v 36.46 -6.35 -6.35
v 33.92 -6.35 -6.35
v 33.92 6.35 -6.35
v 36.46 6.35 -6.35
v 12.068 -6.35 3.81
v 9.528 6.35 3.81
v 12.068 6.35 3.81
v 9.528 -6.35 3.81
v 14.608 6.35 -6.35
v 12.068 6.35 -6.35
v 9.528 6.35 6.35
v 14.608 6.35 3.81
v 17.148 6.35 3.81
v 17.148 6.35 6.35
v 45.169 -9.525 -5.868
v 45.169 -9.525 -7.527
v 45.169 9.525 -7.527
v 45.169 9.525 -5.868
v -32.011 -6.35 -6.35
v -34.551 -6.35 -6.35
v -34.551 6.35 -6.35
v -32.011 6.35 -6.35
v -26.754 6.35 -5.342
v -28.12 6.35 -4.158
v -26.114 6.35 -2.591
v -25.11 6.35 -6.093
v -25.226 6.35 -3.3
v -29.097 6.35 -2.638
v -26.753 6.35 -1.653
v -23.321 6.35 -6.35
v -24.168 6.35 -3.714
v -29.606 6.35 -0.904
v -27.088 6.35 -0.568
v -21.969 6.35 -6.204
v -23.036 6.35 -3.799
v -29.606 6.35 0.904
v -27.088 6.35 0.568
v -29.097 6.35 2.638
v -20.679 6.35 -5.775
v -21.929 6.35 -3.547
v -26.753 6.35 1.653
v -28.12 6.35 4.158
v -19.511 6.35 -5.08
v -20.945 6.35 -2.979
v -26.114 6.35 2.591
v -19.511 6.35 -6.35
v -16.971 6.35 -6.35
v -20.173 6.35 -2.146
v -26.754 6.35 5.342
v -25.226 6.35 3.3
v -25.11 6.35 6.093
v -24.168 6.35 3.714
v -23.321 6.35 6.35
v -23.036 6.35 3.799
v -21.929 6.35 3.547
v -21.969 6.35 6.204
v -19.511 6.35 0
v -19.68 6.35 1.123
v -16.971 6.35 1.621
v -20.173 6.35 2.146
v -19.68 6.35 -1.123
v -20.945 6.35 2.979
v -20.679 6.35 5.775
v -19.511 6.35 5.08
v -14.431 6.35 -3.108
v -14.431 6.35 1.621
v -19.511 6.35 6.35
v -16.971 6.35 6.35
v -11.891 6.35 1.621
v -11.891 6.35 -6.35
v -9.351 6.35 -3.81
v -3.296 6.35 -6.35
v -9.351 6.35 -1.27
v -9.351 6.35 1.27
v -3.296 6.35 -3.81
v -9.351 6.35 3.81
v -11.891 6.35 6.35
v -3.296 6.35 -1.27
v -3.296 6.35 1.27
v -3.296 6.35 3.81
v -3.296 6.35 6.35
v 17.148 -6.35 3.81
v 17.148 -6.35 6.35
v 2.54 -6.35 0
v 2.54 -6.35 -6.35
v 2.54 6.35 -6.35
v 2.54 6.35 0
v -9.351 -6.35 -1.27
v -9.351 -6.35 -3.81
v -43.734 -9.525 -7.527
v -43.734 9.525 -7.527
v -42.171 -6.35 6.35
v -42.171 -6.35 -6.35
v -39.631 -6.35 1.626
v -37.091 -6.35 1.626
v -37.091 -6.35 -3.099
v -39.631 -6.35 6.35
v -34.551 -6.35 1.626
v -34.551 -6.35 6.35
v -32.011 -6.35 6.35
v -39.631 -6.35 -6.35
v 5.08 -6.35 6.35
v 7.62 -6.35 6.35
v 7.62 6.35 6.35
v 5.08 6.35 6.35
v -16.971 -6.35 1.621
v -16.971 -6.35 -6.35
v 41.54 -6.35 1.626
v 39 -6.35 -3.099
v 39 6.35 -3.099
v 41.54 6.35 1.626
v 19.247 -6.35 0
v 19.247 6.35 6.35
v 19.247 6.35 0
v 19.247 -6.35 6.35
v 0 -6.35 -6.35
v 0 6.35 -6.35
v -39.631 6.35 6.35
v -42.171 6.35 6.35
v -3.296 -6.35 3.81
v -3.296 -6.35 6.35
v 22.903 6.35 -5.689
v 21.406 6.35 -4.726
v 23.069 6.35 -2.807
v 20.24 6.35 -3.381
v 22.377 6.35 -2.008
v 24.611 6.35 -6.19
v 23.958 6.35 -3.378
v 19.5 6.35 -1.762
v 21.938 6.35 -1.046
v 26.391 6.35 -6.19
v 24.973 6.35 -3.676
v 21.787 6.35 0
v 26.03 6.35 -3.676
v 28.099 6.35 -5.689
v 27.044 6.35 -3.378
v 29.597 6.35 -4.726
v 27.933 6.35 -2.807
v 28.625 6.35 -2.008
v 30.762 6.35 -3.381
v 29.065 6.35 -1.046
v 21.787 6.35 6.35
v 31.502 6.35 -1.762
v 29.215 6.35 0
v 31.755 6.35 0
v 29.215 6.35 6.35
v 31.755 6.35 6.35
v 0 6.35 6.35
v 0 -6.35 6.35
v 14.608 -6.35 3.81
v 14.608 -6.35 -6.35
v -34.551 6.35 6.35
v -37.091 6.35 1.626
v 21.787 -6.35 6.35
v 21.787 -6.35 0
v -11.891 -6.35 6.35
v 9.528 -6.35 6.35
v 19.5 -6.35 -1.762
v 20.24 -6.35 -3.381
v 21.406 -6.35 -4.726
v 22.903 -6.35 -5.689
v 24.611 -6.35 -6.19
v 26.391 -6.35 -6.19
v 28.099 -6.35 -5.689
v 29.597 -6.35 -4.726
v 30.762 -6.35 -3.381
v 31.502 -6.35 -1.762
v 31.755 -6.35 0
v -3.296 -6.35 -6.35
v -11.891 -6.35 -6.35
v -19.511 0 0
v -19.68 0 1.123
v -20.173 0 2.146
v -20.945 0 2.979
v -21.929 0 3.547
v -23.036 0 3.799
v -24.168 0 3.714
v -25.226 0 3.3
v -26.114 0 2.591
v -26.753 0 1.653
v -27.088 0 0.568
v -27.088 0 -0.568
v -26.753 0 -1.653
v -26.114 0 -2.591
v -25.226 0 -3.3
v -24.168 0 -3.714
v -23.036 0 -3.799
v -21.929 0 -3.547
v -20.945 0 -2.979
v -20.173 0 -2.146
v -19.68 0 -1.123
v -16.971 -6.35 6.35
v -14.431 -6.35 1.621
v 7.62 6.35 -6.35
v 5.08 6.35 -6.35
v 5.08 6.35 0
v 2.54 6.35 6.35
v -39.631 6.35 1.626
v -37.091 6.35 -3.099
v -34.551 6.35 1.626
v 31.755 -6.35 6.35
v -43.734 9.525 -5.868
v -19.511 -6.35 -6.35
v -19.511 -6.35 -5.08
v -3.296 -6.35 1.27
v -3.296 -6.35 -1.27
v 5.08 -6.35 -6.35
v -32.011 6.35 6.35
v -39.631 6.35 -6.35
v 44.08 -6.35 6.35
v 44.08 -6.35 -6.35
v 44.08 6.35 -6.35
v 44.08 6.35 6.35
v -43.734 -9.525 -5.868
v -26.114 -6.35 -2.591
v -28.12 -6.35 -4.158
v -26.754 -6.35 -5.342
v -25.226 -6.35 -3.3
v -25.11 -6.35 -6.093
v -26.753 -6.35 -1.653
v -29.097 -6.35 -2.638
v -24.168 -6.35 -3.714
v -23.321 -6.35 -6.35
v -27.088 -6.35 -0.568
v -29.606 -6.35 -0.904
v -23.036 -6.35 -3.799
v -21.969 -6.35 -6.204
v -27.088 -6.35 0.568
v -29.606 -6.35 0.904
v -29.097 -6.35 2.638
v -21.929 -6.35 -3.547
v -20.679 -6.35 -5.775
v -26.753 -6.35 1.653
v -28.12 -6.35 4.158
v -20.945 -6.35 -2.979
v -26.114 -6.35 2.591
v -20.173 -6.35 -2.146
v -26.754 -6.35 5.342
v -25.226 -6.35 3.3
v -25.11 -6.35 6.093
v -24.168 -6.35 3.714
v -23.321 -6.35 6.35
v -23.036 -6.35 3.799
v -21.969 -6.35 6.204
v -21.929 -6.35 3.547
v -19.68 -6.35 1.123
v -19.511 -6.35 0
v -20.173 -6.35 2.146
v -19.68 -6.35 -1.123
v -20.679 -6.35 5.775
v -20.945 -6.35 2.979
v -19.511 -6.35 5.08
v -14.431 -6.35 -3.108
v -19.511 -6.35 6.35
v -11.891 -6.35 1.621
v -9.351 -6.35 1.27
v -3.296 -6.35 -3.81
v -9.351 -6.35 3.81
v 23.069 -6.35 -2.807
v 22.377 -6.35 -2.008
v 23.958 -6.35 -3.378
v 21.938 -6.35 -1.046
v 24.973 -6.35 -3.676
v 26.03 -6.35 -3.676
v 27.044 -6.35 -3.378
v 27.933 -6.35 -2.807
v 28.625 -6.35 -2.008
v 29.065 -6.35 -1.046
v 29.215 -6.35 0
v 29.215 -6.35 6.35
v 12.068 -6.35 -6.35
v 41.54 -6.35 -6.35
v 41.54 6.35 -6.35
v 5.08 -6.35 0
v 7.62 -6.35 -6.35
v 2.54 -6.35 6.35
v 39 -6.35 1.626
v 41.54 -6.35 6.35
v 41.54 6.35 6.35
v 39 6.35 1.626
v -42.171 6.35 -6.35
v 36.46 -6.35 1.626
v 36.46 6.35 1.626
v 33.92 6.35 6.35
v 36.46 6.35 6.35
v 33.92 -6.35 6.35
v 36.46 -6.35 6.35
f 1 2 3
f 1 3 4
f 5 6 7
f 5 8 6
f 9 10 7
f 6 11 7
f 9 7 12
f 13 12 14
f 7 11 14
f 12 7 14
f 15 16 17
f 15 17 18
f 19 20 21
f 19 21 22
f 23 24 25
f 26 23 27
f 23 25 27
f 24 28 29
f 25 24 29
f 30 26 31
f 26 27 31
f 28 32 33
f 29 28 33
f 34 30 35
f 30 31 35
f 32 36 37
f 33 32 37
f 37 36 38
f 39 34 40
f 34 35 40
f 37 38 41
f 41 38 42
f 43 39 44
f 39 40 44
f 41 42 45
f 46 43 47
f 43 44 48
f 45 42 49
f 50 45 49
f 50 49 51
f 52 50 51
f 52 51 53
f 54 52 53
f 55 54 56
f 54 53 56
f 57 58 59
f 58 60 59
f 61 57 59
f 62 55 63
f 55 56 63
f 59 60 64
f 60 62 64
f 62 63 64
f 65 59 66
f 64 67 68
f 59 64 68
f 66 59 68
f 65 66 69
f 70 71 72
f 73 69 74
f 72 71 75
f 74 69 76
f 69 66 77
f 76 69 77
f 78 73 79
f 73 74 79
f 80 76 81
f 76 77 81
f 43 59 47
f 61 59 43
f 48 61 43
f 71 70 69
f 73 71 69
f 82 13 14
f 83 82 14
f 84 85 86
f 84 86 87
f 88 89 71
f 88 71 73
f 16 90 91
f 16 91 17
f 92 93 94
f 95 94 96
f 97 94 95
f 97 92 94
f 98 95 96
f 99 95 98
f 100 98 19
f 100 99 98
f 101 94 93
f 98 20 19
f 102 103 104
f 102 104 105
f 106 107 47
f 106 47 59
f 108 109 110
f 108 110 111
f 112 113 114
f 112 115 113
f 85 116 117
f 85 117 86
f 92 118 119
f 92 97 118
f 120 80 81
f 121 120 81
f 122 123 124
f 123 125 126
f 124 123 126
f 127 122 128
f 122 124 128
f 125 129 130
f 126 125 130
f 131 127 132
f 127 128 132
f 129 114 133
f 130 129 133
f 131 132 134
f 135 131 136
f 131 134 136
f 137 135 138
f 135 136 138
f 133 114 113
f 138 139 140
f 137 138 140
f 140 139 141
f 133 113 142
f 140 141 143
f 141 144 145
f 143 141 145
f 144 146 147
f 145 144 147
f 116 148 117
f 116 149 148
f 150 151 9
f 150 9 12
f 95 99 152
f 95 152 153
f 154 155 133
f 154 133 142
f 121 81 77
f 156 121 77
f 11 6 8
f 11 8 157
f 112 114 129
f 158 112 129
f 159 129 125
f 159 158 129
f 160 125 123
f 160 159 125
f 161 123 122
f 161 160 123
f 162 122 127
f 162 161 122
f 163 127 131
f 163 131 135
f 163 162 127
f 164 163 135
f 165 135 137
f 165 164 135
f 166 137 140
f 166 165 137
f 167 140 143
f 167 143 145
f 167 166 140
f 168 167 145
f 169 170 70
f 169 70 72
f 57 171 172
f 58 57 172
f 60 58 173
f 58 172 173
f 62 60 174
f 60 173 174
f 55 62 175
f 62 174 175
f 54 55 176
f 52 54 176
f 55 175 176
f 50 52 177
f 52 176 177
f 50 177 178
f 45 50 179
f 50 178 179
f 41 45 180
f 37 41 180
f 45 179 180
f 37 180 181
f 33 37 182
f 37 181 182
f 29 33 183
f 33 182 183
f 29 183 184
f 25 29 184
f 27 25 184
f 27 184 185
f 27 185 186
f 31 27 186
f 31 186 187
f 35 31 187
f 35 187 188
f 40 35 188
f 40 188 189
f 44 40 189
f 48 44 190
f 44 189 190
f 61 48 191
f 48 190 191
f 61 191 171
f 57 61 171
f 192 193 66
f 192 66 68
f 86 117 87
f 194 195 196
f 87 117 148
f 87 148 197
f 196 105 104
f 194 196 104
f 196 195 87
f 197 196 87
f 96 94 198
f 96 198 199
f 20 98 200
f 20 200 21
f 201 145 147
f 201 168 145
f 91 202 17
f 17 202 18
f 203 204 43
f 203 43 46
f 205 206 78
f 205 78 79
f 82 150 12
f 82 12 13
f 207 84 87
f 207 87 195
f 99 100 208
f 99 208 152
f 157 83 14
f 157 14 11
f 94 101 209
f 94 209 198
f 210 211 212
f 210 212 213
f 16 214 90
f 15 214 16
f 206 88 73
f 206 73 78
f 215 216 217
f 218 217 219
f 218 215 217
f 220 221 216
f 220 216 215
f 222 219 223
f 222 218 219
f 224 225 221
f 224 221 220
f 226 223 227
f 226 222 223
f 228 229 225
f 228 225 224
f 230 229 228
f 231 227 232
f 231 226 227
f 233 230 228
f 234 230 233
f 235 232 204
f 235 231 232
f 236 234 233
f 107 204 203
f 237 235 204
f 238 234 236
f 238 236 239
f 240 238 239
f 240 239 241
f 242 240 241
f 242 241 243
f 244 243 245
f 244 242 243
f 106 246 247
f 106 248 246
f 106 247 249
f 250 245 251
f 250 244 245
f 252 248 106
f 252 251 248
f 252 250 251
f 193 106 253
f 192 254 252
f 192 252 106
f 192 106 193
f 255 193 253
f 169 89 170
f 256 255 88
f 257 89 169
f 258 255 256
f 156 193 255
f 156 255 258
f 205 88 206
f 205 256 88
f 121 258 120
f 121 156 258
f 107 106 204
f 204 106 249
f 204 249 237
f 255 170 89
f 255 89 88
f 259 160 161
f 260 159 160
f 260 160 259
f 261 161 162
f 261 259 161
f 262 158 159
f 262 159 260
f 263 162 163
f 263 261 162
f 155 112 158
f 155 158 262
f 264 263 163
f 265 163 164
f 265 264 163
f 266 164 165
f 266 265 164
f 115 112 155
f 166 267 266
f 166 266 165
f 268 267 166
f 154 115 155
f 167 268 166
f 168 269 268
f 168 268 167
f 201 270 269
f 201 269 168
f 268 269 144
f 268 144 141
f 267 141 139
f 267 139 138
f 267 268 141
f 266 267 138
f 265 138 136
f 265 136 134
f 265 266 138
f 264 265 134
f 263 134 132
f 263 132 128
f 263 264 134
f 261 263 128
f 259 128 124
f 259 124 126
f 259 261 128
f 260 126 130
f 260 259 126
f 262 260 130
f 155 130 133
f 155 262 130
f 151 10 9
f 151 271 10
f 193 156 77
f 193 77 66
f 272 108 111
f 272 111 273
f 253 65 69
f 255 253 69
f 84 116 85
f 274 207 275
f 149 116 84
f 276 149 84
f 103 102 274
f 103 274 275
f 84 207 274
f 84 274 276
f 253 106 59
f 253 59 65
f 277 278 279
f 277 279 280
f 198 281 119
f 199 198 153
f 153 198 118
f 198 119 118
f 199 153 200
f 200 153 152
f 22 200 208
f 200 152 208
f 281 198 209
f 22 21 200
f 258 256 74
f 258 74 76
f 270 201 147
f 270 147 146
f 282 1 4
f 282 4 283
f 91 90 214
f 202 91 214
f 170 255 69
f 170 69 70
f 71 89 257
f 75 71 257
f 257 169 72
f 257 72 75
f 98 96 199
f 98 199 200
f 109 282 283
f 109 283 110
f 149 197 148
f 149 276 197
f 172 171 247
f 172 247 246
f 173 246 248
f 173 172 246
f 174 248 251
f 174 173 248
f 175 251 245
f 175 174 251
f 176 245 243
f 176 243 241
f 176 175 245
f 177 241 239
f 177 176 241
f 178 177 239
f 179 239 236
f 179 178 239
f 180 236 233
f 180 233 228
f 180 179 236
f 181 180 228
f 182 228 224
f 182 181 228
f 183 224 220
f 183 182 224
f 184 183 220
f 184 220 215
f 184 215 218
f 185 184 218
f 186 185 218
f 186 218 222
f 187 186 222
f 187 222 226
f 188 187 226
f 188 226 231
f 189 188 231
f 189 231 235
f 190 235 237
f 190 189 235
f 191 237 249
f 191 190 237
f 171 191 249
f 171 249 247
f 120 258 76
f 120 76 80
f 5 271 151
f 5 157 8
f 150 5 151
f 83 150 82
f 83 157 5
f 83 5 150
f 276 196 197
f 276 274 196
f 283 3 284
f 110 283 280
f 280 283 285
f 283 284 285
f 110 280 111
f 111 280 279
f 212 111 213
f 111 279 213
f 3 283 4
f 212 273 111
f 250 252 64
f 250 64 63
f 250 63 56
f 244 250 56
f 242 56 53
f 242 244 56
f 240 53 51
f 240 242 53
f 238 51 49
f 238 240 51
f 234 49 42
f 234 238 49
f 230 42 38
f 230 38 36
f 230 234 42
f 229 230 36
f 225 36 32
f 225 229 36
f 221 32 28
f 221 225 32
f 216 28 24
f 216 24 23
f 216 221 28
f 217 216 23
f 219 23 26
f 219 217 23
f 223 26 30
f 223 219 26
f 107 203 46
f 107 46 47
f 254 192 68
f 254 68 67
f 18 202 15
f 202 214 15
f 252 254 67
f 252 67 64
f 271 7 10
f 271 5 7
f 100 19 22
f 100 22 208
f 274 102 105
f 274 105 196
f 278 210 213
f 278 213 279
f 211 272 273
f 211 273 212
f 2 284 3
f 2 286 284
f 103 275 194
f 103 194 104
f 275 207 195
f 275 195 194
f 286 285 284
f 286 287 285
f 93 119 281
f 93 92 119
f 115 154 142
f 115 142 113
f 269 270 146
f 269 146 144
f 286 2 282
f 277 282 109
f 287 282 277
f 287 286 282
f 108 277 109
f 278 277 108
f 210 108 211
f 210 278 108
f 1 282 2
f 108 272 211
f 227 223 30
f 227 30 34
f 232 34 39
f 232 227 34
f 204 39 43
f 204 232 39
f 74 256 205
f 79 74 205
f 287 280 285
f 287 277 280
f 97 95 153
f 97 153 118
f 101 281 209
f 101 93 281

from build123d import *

# Parameters (mm, degrees)
F1_DEPTH = 6.35
F0_R     = 3.81
F0_W     = 6.0548761711
F0_H     = 2.54
F0_W_2   = 2.54
F0_H_2   = 10.16
F2_W     = 88.9036133885
F2_H     = 1.6595339403
F3_DEPTH = 9.525


with BuildPart() as f1:
    # F0 (on Front) → F1 (new body, symmetric)
    with BuildSketch(Plane.XZ):
        Polygon((-42.1707964678, -6.35), (-39.6307964678, -6.35), (-39.6307964678, 1.6256), (-42.1707964678, 6.35), align=None)
        Polygon((-42.1707964678, 6.35), (-39.6307964678, 1.6256), (-39.6307964678, 6.35), align=None)
        Polygon((-39.6307964678, 6.35), (-39.6307964678, 1.6256), (-37.0907964678, -3.0988), (-37.0907964678, 1.6256), align=None)
        Polygon((-37.0907964678, 1.6256), (-37.0907964678, -3.0988), (-34.5507964678, 1.6256), (-34.5507964678, 6.35), align=None)
        Polygon((-34.5507964678, 6.35), (-34.5507964678, 1.6256), (-32.0107964678, 6.35), align=None)
        Polygon((-34.5507964678, 1.6256), (-34.5507964678, -6.35), (-32.0107964678, -6.35), (-32.0107964678, 6.35), align=None)
    extrude(amount=F1_DEPTH, both=True)


with BuildPart() as f1b:
    # F0 (on Front) → F1, piece 2 (new body, symmetric)
    with BuildSketch(Plane.XZ):
        with BuildLine():
            ThreePointArc((-23.3206523725, 6.35), (-29.6706523725, 0), (-23.3206523725, -6.35))
            ThreePointArc((-23.3206523725, -6.35), (-21.3126060583, -6.0241389426), (-19.5106523725, -5.08))
            Line((-19.5106523725, -5.08), (-19.5106523725, 0))
            Line((-19.5106523725, 0), (-19.5106523725, 5.08))
            ThreePointArc((-19.5106523725, 5.08), (-21.3126060583, 6.0241389426), (-23.3206523725, 6.35))
        make_face()
        with Locations((-23.3206523725, 0)):
            Circle(F0_R, mode=Mode.SUBTRACT)
        with BuildLine():
            ThreePointArc((-16.9706523725, 0), (-17.6410397097, 2.8398063314), (-19.5106523725, 5.08))
            Line((-19.5106523725, 5.08), (-19.5106523725, 0))
            Line((-19.5106523725, 0), (-16.9706523725, 0))
        make_face()
        with BuildLine():
            Line((-19.5106523725, 0), (-19.5106523725, -5.08))
            ThreePointArc((-19.5106523725, -5.08), (-17.6410397097, -2.8398063314), (-16.9706523725, 0))
            Line((-16.9706523725, 0), (-19.5106523725, 0))
        make_face()
        with BuildLine():
            Line((-19.5106523725, -5.08), (-19.5106523725, -6.35))
            Line((-19.5106523725, -6.35), (-16.9706523725, -6.35))
            Line((-16.9706523725, -6.35), (-16.9706523725, 0))
            ThreePointArc((-16.9706523725, 0), (-17.6410397097, -2.8398063314), (-19.5106523725, -5.08))
        make_face()
        Polygon((-16.9706523725, 6.35), (-19.5106523725, 6.35), (-16.9706523725, 1.621060252), align=None)
        with BuildLine():
            Line((-16.9706523725, 1.621060252), (-19.5106523725, 6.35))
            Line((-19.5106523725, 6.35), (-19.5106523725, 5.08))
            ThreePointArc((-19.5106523725, 5.08), (-17.6410397097, 2.8398063314), (-16.9706523725, 0))
            Line((-16.9706523725, 0), (-16.9706523725, 1.621060252))
        make_face()
        Polygon((-14.4306523725, 1.621060252), (-16.9706523725, 6.35), (-16.9706523725, 1.621060252), (-14.4306523725, -3.1078794961), align=None)
        Polygon((-11.8906523725, 6.35), (-14.4306523725, 1.621060252), (-14.4306523725, -3.1078794961), (-11.8906523725, 1.621060252), (-11.8906523725, 3.81), align=None)
        Polygon((-9.3506523725, 6.35), (-11.8906523725, 6.35), (-11.8906523725, 3.81), (-10.7149328125, 3.81), align=None)
        Polygon((-11.8906523725, 3.81), (-11.8906523725, 1.621060252), (-10.7149328125, 3.81), align=None)
        with Locations((-6.323214287, 5.08)):
            Rectangle(F0_W, F0_H)
        Polygon((-10.7149328125, 3.81), (-11.8906523725, 1.621060252), (-11.8906523725, 1.27), (-9.3506523725, 1.27), (-9.3506523725, 3.81), align=None)
        Polygon((-9.3506523725, 3.81), (-9.3506523725, 6.35), (-10.7149328125, 3.81), align=None)
        with Locations((-10.6206523725, 0)):
            Rectangle(F0_W_2, F0_H)
        with Locations((-6.323214287, 0)):
            Rectangle(F0_W, F0_H)
        with Locations((-10.6206523725, -2.54)):
            Rectangle(F0_W_2, F0_H)
        with Locations((-10.6206523725, -5.08)):
            Rectangle(F0_W_2, F0_H)
        with Locations((-6.323214287, -5.08)):
            Rectangle(F0_W, F0_H)
    extrude(amount=F1_DEPTH, both=True)


with BuildPart() as f1c:
    # F0 (on Front) → F1, piece 3 (new body, symmetric)
    with BuildSketch(Plane.XZ):
        Polygon((0, 6.35), (0, -6.35), (2.54, -6.35), (2.54, 0), align=None)
        Polygon((2.54, 6.35), (0, 6.35), (2.54, 0), align=None)
        Polygon((5.08, 0), (2.54, 6.35), (2.54, 0), (5.08, -6.35), align=None)
        Polygon((5.08, 0), (5.08, -6.35), (7.62, -6.35), align=None)
        Polygon((5.08, 6.35), (5.08, 0), (7.62, -6.35), (7.62, 6.35), align=None)
    extrude(amount=F1_DEPTH, both=True)


with BuildPart() as f1d:
    # F0 (on Front) → F1, piece 4 (new body, symmetric)
    with BuildSketch(Plane.XZ):
        with Locations((13.3382392576, -1.27)):
            Rectangle(F0_W_2, F0_H_2)
        with Locations((15.8782392576, 5.08)):
            Rectangle(F0_W_2, F0_H)
        with Locations((13.3382392576, 5.08)):
            Rectangle(F0_W_2, F0_H)
        with Locations((10.7982392576, 5.08)):
            Rectangle(F0_W_2, F0_H)
    extrude(amount=F1_DEPTH, both=True)


with BuildPart() as f1e:
    # F0 (on Front) → F1, piece 5 (new body, symmetric)
    with BuildSketch(Plane.XZ):
        with BuildLine():
            Line((31.7550115287, 0), (31.7550115287, 6.35))
            Line((31.7550115287, 6.35), (29.2150115287, 6.35))
            Line((29.2150115287, 6.35), (29.2150115287, 0))
            ThreePointArc((29.2150115287, 0), (25.5010910332, -3.7139204955), (21.7871705377, 0))
            Line((21.7871705377, 0), (21.7871705377, 6.35))
            Line((21.7871705377, 6.35), (19.2471705377, 6.35))
            Line((19.2471705377, 6.35), (19.2471705377, 0))
            ThreePointArc((19.2471705377, 0), (25.5010910332, -6.2539204955), (31.7550115287, 0))
        make_face()
    extrude(amount=F1_DEPTH, both=True)


with BuildPart() as f1f:
    # F0 (on Front) → F1, piece 6 (new body, symmetric)
    with BuildSketch(Plane.XZ):
        Polygon((33.9198186994, 6.35), (33.9198186994, -6.35), (36.4598186994, -6.35), (36.4598186994, 1.6256), align=None)
        Polygon((36.4598186994, 6.35), (33.9198186994, 6.35), (36.4598186994, 1.6256), align=None)
        Polygon((36.4598186994, 6.35), (36.4598186994, 1.6256), (38.9998186994, -3.0988), (38.9998186994, 1.6256), align=None)
        Polygon((38.9998186994, 1.6256), (38.9998186994, -3.0988), (41.5398186994, 1.6256), (41.5398186994, 6.35), align=None)
        Polygon((41.5398186994, 6.35), (41.5398186994, 1.6256), (44.0798186994, 6.35), align=None)
        Polygon((41.5398186994, 1.6256), (41.5398186994, -6.35), (44.0798186994, -6.35), (44.0798186994, 6.35), align=None)
    extrude(amount=F1_DEPTH, both=True)


with BuildPart() as f3:
    # F2 (on Front) → F3 (new body, symmetric)
    with BuildSketch(Plane.XZ):
        with Locations((0.7174350321, -6.6974051297)):
            Rectangle(F2_W, F2_H)
    extrude(amount=F3_DEPTH, both=True)


solid = Compound([f1.part, f1b.part, f1c.part, f1d.part, f1e.part, f1f.part, f3.part])
